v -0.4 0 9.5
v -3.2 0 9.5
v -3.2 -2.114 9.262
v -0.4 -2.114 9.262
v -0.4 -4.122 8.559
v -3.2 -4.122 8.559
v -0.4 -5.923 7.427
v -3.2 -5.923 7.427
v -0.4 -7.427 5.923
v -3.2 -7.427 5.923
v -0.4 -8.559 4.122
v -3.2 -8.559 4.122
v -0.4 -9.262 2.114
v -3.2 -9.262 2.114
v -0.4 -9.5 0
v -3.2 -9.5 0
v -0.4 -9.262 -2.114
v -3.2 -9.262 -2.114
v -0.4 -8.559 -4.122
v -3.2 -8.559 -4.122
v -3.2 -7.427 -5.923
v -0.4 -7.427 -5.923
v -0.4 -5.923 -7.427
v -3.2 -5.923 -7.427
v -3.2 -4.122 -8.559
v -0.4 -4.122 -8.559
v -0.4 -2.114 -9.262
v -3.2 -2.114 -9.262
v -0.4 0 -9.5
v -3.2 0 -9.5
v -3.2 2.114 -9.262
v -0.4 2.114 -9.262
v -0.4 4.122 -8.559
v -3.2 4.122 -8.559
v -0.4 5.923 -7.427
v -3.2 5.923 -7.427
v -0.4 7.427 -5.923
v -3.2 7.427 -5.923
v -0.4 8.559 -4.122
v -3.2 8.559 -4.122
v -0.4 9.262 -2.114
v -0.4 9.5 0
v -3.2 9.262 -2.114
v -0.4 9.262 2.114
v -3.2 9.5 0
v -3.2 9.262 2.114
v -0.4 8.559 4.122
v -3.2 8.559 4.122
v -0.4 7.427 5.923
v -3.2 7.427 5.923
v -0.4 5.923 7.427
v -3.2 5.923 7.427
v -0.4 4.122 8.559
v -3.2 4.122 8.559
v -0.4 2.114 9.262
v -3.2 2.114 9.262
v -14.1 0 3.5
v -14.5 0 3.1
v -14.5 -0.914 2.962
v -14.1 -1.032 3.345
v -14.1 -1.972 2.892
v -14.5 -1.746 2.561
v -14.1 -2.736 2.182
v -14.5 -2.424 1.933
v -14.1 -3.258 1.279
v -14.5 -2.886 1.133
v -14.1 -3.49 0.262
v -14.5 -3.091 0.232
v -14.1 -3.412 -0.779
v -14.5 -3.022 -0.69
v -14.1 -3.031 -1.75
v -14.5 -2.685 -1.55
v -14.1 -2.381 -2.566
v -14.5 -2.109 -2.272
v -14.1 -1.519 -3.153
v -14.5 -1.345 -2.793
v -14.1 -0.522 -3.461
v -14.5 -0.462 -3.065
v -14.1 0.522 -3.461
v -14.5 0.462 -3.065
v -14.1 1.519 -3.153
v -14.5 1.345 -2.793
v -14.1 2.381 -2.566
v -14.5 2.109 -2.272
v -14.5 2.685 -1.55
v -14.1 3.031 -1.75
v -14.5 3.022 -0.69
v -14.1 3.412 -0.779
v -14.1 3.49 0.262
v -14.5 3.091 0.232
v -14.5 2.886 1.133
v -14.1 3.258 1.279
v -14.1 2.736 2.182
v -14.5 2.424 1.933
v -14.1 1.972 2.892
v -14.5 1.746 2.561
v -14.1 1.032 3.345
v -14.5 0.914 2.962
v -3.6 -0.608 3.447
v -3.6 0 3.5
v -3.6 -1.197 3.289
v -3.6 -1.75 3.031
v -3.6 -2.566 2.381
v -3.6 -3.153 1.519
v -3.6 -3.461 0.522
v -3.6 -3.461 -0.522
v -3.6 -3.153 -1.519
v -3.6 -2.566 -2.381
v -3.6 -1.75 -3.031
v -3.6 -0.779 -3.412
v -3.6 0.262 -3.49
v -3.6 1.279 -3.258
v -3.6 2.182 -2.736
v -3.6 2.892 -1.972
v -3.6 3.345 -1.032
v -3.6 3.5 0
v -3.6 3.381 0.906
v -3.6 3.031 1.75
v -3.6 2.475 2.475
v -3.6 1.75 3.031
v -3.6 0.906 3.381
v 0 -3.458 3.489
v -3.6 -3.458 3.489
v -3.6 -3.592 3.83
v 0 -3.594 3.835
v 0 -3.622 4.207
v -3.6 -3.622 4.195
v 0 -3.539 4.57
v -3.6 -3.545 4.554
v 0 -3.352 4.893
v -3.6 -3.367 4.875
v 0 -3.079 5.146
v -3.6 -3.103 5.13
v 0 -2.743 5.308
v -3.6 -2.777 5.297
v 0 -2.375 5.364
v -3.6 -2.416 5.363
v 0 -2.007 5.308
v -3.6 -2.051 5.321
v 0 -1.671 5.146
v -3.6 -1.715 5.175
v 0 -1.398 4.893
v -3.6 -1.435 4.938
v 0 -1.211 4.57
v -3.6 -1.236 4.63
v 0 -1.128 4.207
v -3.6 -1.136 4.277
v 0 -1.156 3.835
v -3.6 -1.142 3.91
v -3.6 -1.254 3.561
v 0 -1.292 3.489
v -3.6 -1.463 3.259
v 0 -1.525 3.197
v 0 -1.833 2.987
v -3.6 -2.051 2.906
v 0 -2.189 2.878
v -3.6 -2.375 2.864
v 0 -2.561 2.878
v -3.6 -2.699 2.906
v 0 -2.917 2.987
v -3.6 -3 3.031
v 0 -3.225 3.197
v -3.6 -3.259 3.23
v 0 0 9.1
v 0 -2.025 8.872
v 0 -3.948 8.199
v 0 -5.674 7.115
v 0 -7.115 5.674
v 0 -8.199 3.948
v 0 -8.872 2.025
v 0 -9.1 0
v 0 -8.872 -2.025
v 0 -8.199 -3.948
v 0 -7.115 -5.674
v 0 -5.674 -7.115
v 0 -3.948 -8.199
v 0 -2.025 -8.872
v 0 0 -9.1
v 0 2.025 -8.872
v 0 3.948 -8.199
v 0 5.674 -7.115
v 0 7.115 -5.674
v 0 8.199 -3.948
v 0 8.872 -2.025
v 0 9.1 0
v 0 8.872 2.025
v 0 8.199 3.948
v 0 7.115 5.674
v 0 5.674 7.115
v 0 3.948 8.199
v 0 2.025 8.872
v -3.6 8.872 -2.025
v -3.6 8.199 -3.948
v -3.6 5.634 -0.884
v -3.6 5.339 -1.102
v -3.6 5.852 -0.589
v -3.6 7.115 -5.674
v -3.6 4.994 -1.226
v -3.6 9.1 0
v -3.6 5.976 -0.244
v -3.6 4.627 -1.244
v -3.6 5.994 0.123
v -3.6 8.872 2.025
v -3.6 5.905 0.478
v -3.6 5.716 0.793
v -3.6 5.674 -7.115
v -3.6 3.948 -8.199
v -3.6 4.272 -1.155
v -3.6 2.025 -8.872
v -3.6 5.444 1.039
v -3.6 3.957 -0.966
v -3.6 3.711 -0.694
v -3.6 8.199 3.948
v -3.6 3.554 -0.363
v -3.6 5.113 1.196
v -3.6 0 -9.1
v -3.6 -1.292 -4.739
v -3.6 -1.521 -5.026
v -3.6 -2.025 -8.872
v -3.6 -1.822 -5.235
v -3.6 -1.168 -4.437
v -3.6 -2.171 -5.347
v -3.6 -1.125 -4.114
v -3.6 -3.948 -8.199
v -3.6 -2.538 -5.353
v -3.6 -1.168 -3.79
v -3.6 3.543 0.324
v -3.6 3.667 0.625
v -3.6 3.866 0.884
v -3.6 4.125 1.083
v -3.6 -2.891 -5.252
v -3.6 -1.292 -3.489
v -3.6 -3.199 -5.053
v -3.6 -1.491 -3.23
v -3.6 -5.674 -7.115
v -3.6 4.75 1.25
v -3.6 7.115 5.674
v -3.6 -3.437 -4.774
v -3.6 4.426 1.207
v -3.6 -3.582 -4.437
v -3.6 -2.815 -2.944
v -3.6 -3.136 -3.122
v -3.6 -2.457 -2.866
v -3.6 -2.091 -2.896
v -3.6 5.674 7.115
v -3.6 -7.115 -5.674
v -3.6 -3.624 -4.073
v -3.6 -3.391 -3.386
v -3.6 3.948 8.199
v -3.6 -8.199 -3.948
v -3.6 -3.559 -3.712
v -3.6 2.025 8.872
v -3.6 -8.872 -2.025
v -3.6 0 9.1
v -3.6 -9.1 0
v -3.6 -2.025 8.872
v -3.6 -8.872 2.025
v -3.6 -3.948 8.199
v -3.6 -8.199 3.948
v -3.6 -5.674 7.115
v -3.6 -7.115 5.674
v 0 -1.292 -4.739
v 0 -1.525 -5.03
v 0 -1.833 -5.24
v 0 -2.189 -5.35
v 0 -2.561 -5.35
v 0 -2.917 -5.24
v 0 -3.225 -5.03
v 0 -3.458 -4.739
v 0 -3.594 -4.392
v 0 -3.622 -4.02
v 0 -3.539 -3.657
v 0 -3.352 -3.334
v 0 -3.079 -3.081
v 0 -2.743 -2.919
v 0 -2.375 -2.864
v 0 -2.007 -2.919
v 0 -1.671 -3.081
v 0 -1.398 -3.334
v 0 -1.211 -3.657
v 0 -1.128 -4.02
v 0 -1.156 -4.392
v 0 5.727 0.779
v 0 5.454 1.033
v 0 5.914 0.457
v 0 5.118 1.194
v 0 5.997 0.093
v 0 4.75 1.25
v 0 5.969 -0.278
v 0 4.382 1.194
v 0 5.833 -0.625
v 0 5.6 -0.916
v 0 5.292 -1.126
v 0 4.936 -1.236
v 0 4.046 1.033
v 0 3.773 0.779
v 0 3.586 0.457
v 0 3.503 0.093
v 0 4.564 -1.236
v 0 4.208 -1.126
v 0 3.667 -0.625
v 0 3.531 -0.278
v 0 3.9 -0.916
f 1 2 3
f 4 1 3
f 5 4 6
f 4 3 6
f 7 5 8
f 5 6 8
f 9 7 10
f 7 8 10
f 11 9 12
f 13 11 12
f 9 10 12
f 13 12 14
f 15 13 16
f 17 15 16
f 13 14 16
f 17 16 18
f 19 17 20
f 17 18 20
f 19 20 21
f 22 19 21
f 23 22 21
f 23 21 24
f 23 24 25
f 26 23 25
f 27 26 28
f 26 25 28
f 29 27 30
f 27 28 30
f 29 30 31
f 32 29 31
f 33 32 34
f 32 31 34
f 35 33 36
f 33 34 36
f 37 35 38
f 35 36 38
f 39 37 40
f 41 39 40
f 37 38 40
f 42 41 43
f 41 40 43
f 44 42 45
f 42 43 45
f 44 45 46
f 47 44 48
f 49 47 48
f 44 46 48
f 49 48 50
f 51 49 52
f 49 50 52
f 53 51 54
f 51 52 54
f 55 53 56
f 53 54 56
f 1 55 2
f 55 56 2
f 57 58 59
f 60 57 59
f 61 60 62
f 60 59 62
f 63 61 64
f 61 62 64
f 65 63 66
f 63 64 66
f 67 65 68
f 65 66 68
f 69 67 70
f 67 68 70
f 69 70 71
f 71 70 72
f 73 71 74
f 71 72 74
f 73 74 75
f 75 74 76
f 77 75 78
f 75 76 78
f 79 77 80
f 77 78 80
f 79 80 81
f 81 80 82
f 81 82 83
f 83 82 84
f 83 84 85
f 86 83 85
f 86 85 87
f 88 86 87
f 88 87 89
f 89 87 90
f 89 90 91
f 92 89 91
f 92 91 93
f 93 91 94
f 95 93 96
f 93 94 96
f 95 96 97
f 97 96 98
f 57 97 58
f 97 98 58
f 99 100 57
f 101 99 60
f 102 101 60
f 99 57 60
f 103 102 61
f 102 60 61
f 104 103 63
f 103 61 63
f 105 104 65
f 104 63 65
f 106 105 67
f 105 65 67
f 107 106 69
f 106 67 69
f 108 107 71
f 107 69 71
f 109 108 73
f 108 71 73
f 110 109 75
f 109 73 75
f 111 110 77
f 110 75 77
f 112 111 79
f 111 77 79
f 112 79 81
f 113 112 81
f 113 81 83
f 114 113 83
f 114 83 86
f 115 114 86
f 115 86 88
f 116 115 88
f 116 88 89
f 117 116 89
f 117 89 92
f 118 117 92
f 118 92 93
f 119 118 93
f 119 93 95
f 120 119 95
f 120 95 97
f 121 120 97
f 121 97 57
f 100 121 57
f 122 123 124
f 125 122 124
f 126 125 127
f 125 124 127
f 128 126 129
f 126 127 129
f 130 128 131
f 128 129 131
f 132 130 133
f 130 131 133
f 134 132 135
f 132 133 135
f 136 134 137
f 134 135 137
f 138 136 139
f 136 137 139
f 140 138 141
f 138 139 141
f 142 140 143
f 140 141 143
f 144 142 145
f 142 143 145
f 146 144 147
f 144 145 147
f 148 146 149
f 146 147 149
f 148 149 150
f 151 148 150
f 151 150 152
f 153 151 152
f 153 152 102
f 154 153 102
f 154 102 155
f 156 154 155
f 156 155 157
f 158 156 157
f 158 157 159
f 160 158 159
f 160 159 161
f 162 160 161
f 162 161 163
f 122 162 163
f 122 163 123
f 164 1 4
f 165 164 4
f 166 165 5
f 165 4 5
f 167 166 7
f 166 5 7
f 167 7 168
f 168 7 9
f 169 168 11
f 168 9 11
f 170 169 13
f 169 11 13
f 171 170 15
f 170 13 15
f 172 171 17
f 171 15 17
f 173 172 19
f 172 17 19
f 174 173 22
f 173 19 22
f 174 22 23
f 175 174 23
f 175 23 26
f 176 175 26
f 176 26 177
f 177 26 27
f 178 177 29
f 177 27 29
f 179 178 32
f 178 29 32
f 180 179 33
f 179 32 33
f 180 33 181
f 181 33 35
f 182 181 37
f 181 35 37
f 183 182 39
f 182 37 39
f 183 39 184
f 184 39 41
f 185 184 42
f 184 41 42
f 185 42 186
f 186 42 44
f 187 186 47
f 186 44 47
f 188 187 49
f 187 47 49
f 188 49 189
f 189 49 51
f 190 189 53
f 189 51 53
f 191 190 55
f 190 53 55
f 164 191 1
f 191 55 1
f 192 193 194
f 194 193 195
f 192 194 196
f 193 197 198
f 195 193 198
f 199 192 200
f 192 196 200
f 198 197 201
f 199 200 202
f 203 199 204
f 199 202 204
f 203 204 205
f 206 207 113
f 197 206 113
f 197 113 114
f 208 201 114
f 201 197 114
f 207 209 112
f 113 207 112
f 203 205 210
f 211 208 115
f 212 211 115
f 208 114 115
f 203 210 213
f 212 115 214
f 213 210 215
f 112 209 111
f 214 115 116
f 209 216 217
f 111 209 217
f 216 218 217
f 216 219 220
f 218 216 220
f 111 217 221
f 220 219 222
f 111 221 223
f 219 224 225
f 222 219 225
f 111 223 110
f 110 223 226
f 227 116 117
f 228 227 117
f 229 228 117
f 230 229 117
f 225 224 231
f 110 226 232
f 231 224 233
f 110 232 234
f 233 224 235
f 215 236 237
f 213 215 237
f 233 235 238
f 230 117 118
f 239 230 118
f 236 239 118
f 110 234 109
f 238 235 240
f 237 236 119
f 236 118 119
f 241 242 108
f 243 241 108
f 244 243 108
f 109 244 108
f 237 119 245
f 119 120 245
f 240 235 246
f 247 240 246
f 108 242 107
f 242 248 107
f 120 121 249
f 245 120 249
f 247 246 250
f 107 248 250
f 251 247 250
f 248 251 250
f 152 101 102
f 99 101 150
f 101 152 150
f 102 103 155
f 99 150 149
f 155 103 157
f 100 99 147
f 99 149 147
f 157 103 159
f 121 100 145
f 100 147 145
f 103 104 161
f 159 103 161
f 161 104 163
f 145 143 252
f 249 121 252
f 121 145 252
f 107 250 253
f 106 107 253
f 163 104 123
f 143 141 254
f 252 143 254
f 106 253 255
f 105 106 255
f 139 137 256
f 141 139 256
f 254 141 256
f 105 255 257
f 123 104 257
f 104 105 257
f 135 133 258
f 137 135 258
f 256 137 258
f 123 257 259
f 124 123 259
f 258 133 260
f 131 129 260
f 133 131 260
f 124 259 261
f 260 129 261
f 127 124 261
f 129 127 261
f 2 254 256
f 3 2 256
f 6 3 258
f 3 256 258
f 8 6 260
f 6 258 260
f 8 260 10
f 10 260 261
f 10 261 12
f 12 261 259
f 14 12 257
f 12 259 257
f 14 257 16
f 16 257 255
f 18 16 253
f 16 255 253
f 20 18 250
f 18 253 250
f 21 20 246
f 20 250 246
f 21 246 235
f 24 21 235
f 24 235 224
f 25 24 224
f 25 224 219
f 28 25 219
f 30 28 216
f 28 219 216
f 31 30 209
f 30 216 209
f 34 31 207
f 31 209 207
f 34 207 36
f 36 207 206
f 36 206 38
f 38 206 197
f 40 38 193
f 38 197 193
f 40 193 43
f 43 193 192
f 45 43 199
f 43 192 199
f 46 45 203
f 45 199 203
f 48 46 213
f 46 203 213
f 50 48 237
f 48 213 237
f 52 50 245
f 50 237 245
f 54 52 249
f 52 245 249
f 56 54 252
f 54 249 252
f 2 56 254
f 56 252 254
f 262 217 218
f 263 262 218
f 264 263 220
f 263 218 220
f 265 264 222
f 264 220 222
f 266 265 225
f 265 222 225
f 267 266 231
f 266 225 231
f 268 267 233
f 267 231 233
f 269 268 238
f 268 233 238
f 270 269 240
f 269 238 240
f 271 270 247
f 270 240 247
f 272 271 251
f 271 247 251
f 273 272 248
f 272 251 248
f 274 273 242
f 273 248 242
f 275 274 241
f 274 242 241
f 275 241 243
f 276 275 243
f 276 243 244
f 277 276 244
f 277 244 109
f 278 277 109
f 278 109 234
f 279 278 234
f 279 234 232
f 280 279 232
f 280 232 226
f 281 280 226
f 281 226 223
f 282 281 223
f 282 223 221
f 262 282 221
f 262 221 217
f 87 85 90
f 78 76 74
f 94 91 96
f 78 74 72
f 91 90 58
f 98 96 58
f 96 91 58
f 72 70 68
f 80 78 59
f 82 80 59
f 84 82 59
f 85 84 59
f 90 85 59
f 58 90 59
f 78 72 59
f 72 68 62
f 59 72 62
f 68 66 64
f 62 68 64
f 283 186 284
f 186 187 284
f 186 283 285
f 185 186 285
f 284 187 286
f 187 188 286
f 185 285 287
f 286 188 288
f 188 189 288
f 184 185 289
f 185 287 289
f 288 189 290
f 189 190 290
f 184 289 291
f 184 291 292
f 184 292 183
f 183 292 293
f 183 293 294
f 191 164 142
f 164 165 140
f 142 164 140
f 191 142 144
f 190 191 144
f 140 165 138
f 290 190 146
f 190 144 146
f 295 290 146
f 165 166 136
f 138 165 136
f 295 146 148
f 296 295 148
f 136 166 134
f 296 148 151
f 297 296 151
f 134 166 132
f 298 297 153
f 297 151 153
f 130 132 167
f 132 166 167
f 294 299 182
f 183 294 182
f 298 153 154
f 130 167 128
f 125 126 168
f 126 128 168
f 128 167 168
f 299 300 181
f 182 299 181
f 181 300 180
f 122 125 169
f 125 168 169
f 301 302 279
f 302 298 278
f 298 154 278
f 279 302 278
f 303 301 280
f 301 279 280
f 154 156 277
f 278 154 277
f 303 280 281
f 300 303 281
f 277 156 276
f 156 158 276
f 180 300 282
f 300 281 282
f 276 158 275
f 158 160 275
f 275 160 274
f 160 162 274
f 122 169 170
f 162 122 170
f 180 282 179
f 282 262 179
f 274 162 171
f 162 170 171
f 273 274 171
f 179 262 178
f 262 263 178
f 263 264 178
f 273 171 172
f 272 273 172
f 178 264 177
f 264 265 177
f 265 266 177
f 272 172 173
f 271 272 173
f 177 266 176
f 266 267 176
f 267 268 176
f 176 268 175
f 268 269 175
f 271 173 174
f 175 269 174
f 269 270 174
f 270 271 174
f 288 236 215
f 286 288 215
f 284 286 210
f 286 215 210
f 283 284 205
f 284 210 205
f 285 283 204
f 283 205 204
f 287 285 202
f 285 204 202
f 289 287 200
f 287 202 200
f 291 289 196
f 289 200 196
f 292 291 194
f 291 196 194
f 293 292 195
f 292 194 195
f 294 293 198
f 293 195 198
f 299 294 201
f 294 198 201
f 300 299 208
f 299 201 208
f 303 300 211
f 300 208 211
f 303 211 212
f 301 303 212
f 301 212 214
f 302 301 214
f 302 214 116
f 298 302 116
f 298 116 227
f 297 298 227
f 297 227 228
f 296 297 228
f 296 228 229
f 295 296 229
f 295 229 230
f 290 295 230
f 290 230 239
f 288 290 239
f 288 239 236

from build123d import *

# Parameters (mm, degrees)
SKETCH_3_R               = 1.25
CUT_EXTRUDE_1_DEPTH      = 18.300578025
CHAMFER_1_SIZE           = 0.4
PATTERN_CIRCULAR_1_COUNT = 3


with BuildPart() as part:
    # Эскиз2 → Повернуть1 (revolve)
    with BuildSketch(Plane.XY, mode=Mode.PRIVATE) as revolve_1_sk:
        Polygon((0, 0), (0, 9.5), (-3.6, 9.5), (-3.6, 3.5), (-14.5, 3.5), (-14.5, 0), align=None)
    revolve(revolve_1_sk.sketch.rotate(Axis((-14.5, 0, 0), (1, 0, 0)), 90), axis=Axis((-14.5, 0, 0), (1, 0, 0)))

    # Эскиз3 → Вырез-Вытянуть1 (cut, through all)
    with BuildSketch(Plane.ZY.offset(3.6)):
        with Locations((0, 4.75)):
            Circle(SKETCH_3_R)
    cut_extrude_1 = extrude(amount=-CUT_EXTRUDE_1_DEPTH, mode=Mode.SUBTRACT)

    # Фаска1
    chamfer_1_edges = [part.edges().sort_by_distance(p)[0] for p in [
        (-14.5, 0, -3.5),
        (-3.6, 0, -9.5),
        (0, 0, -9.5),
    ]]
    chamfer(chamfer_1_edges, length=CHAMFER_1_SIZE)

    # Круговой массив1: Вырез-Вытянуть1 ×3 about axis
    pattern_circular_1_axis = Axis((0, 0, 0), (1, 0, 0))
    for i in range(1, PATTERN_CIRCULAR_1_COUNT):
        add(cut_extrude_1.rotate(pattern_circular_1_axis, i * 360 / PATTERN_CIRCULAR_1_COUNT), mode=Mode.SUBTRACT)


solid = part.part
